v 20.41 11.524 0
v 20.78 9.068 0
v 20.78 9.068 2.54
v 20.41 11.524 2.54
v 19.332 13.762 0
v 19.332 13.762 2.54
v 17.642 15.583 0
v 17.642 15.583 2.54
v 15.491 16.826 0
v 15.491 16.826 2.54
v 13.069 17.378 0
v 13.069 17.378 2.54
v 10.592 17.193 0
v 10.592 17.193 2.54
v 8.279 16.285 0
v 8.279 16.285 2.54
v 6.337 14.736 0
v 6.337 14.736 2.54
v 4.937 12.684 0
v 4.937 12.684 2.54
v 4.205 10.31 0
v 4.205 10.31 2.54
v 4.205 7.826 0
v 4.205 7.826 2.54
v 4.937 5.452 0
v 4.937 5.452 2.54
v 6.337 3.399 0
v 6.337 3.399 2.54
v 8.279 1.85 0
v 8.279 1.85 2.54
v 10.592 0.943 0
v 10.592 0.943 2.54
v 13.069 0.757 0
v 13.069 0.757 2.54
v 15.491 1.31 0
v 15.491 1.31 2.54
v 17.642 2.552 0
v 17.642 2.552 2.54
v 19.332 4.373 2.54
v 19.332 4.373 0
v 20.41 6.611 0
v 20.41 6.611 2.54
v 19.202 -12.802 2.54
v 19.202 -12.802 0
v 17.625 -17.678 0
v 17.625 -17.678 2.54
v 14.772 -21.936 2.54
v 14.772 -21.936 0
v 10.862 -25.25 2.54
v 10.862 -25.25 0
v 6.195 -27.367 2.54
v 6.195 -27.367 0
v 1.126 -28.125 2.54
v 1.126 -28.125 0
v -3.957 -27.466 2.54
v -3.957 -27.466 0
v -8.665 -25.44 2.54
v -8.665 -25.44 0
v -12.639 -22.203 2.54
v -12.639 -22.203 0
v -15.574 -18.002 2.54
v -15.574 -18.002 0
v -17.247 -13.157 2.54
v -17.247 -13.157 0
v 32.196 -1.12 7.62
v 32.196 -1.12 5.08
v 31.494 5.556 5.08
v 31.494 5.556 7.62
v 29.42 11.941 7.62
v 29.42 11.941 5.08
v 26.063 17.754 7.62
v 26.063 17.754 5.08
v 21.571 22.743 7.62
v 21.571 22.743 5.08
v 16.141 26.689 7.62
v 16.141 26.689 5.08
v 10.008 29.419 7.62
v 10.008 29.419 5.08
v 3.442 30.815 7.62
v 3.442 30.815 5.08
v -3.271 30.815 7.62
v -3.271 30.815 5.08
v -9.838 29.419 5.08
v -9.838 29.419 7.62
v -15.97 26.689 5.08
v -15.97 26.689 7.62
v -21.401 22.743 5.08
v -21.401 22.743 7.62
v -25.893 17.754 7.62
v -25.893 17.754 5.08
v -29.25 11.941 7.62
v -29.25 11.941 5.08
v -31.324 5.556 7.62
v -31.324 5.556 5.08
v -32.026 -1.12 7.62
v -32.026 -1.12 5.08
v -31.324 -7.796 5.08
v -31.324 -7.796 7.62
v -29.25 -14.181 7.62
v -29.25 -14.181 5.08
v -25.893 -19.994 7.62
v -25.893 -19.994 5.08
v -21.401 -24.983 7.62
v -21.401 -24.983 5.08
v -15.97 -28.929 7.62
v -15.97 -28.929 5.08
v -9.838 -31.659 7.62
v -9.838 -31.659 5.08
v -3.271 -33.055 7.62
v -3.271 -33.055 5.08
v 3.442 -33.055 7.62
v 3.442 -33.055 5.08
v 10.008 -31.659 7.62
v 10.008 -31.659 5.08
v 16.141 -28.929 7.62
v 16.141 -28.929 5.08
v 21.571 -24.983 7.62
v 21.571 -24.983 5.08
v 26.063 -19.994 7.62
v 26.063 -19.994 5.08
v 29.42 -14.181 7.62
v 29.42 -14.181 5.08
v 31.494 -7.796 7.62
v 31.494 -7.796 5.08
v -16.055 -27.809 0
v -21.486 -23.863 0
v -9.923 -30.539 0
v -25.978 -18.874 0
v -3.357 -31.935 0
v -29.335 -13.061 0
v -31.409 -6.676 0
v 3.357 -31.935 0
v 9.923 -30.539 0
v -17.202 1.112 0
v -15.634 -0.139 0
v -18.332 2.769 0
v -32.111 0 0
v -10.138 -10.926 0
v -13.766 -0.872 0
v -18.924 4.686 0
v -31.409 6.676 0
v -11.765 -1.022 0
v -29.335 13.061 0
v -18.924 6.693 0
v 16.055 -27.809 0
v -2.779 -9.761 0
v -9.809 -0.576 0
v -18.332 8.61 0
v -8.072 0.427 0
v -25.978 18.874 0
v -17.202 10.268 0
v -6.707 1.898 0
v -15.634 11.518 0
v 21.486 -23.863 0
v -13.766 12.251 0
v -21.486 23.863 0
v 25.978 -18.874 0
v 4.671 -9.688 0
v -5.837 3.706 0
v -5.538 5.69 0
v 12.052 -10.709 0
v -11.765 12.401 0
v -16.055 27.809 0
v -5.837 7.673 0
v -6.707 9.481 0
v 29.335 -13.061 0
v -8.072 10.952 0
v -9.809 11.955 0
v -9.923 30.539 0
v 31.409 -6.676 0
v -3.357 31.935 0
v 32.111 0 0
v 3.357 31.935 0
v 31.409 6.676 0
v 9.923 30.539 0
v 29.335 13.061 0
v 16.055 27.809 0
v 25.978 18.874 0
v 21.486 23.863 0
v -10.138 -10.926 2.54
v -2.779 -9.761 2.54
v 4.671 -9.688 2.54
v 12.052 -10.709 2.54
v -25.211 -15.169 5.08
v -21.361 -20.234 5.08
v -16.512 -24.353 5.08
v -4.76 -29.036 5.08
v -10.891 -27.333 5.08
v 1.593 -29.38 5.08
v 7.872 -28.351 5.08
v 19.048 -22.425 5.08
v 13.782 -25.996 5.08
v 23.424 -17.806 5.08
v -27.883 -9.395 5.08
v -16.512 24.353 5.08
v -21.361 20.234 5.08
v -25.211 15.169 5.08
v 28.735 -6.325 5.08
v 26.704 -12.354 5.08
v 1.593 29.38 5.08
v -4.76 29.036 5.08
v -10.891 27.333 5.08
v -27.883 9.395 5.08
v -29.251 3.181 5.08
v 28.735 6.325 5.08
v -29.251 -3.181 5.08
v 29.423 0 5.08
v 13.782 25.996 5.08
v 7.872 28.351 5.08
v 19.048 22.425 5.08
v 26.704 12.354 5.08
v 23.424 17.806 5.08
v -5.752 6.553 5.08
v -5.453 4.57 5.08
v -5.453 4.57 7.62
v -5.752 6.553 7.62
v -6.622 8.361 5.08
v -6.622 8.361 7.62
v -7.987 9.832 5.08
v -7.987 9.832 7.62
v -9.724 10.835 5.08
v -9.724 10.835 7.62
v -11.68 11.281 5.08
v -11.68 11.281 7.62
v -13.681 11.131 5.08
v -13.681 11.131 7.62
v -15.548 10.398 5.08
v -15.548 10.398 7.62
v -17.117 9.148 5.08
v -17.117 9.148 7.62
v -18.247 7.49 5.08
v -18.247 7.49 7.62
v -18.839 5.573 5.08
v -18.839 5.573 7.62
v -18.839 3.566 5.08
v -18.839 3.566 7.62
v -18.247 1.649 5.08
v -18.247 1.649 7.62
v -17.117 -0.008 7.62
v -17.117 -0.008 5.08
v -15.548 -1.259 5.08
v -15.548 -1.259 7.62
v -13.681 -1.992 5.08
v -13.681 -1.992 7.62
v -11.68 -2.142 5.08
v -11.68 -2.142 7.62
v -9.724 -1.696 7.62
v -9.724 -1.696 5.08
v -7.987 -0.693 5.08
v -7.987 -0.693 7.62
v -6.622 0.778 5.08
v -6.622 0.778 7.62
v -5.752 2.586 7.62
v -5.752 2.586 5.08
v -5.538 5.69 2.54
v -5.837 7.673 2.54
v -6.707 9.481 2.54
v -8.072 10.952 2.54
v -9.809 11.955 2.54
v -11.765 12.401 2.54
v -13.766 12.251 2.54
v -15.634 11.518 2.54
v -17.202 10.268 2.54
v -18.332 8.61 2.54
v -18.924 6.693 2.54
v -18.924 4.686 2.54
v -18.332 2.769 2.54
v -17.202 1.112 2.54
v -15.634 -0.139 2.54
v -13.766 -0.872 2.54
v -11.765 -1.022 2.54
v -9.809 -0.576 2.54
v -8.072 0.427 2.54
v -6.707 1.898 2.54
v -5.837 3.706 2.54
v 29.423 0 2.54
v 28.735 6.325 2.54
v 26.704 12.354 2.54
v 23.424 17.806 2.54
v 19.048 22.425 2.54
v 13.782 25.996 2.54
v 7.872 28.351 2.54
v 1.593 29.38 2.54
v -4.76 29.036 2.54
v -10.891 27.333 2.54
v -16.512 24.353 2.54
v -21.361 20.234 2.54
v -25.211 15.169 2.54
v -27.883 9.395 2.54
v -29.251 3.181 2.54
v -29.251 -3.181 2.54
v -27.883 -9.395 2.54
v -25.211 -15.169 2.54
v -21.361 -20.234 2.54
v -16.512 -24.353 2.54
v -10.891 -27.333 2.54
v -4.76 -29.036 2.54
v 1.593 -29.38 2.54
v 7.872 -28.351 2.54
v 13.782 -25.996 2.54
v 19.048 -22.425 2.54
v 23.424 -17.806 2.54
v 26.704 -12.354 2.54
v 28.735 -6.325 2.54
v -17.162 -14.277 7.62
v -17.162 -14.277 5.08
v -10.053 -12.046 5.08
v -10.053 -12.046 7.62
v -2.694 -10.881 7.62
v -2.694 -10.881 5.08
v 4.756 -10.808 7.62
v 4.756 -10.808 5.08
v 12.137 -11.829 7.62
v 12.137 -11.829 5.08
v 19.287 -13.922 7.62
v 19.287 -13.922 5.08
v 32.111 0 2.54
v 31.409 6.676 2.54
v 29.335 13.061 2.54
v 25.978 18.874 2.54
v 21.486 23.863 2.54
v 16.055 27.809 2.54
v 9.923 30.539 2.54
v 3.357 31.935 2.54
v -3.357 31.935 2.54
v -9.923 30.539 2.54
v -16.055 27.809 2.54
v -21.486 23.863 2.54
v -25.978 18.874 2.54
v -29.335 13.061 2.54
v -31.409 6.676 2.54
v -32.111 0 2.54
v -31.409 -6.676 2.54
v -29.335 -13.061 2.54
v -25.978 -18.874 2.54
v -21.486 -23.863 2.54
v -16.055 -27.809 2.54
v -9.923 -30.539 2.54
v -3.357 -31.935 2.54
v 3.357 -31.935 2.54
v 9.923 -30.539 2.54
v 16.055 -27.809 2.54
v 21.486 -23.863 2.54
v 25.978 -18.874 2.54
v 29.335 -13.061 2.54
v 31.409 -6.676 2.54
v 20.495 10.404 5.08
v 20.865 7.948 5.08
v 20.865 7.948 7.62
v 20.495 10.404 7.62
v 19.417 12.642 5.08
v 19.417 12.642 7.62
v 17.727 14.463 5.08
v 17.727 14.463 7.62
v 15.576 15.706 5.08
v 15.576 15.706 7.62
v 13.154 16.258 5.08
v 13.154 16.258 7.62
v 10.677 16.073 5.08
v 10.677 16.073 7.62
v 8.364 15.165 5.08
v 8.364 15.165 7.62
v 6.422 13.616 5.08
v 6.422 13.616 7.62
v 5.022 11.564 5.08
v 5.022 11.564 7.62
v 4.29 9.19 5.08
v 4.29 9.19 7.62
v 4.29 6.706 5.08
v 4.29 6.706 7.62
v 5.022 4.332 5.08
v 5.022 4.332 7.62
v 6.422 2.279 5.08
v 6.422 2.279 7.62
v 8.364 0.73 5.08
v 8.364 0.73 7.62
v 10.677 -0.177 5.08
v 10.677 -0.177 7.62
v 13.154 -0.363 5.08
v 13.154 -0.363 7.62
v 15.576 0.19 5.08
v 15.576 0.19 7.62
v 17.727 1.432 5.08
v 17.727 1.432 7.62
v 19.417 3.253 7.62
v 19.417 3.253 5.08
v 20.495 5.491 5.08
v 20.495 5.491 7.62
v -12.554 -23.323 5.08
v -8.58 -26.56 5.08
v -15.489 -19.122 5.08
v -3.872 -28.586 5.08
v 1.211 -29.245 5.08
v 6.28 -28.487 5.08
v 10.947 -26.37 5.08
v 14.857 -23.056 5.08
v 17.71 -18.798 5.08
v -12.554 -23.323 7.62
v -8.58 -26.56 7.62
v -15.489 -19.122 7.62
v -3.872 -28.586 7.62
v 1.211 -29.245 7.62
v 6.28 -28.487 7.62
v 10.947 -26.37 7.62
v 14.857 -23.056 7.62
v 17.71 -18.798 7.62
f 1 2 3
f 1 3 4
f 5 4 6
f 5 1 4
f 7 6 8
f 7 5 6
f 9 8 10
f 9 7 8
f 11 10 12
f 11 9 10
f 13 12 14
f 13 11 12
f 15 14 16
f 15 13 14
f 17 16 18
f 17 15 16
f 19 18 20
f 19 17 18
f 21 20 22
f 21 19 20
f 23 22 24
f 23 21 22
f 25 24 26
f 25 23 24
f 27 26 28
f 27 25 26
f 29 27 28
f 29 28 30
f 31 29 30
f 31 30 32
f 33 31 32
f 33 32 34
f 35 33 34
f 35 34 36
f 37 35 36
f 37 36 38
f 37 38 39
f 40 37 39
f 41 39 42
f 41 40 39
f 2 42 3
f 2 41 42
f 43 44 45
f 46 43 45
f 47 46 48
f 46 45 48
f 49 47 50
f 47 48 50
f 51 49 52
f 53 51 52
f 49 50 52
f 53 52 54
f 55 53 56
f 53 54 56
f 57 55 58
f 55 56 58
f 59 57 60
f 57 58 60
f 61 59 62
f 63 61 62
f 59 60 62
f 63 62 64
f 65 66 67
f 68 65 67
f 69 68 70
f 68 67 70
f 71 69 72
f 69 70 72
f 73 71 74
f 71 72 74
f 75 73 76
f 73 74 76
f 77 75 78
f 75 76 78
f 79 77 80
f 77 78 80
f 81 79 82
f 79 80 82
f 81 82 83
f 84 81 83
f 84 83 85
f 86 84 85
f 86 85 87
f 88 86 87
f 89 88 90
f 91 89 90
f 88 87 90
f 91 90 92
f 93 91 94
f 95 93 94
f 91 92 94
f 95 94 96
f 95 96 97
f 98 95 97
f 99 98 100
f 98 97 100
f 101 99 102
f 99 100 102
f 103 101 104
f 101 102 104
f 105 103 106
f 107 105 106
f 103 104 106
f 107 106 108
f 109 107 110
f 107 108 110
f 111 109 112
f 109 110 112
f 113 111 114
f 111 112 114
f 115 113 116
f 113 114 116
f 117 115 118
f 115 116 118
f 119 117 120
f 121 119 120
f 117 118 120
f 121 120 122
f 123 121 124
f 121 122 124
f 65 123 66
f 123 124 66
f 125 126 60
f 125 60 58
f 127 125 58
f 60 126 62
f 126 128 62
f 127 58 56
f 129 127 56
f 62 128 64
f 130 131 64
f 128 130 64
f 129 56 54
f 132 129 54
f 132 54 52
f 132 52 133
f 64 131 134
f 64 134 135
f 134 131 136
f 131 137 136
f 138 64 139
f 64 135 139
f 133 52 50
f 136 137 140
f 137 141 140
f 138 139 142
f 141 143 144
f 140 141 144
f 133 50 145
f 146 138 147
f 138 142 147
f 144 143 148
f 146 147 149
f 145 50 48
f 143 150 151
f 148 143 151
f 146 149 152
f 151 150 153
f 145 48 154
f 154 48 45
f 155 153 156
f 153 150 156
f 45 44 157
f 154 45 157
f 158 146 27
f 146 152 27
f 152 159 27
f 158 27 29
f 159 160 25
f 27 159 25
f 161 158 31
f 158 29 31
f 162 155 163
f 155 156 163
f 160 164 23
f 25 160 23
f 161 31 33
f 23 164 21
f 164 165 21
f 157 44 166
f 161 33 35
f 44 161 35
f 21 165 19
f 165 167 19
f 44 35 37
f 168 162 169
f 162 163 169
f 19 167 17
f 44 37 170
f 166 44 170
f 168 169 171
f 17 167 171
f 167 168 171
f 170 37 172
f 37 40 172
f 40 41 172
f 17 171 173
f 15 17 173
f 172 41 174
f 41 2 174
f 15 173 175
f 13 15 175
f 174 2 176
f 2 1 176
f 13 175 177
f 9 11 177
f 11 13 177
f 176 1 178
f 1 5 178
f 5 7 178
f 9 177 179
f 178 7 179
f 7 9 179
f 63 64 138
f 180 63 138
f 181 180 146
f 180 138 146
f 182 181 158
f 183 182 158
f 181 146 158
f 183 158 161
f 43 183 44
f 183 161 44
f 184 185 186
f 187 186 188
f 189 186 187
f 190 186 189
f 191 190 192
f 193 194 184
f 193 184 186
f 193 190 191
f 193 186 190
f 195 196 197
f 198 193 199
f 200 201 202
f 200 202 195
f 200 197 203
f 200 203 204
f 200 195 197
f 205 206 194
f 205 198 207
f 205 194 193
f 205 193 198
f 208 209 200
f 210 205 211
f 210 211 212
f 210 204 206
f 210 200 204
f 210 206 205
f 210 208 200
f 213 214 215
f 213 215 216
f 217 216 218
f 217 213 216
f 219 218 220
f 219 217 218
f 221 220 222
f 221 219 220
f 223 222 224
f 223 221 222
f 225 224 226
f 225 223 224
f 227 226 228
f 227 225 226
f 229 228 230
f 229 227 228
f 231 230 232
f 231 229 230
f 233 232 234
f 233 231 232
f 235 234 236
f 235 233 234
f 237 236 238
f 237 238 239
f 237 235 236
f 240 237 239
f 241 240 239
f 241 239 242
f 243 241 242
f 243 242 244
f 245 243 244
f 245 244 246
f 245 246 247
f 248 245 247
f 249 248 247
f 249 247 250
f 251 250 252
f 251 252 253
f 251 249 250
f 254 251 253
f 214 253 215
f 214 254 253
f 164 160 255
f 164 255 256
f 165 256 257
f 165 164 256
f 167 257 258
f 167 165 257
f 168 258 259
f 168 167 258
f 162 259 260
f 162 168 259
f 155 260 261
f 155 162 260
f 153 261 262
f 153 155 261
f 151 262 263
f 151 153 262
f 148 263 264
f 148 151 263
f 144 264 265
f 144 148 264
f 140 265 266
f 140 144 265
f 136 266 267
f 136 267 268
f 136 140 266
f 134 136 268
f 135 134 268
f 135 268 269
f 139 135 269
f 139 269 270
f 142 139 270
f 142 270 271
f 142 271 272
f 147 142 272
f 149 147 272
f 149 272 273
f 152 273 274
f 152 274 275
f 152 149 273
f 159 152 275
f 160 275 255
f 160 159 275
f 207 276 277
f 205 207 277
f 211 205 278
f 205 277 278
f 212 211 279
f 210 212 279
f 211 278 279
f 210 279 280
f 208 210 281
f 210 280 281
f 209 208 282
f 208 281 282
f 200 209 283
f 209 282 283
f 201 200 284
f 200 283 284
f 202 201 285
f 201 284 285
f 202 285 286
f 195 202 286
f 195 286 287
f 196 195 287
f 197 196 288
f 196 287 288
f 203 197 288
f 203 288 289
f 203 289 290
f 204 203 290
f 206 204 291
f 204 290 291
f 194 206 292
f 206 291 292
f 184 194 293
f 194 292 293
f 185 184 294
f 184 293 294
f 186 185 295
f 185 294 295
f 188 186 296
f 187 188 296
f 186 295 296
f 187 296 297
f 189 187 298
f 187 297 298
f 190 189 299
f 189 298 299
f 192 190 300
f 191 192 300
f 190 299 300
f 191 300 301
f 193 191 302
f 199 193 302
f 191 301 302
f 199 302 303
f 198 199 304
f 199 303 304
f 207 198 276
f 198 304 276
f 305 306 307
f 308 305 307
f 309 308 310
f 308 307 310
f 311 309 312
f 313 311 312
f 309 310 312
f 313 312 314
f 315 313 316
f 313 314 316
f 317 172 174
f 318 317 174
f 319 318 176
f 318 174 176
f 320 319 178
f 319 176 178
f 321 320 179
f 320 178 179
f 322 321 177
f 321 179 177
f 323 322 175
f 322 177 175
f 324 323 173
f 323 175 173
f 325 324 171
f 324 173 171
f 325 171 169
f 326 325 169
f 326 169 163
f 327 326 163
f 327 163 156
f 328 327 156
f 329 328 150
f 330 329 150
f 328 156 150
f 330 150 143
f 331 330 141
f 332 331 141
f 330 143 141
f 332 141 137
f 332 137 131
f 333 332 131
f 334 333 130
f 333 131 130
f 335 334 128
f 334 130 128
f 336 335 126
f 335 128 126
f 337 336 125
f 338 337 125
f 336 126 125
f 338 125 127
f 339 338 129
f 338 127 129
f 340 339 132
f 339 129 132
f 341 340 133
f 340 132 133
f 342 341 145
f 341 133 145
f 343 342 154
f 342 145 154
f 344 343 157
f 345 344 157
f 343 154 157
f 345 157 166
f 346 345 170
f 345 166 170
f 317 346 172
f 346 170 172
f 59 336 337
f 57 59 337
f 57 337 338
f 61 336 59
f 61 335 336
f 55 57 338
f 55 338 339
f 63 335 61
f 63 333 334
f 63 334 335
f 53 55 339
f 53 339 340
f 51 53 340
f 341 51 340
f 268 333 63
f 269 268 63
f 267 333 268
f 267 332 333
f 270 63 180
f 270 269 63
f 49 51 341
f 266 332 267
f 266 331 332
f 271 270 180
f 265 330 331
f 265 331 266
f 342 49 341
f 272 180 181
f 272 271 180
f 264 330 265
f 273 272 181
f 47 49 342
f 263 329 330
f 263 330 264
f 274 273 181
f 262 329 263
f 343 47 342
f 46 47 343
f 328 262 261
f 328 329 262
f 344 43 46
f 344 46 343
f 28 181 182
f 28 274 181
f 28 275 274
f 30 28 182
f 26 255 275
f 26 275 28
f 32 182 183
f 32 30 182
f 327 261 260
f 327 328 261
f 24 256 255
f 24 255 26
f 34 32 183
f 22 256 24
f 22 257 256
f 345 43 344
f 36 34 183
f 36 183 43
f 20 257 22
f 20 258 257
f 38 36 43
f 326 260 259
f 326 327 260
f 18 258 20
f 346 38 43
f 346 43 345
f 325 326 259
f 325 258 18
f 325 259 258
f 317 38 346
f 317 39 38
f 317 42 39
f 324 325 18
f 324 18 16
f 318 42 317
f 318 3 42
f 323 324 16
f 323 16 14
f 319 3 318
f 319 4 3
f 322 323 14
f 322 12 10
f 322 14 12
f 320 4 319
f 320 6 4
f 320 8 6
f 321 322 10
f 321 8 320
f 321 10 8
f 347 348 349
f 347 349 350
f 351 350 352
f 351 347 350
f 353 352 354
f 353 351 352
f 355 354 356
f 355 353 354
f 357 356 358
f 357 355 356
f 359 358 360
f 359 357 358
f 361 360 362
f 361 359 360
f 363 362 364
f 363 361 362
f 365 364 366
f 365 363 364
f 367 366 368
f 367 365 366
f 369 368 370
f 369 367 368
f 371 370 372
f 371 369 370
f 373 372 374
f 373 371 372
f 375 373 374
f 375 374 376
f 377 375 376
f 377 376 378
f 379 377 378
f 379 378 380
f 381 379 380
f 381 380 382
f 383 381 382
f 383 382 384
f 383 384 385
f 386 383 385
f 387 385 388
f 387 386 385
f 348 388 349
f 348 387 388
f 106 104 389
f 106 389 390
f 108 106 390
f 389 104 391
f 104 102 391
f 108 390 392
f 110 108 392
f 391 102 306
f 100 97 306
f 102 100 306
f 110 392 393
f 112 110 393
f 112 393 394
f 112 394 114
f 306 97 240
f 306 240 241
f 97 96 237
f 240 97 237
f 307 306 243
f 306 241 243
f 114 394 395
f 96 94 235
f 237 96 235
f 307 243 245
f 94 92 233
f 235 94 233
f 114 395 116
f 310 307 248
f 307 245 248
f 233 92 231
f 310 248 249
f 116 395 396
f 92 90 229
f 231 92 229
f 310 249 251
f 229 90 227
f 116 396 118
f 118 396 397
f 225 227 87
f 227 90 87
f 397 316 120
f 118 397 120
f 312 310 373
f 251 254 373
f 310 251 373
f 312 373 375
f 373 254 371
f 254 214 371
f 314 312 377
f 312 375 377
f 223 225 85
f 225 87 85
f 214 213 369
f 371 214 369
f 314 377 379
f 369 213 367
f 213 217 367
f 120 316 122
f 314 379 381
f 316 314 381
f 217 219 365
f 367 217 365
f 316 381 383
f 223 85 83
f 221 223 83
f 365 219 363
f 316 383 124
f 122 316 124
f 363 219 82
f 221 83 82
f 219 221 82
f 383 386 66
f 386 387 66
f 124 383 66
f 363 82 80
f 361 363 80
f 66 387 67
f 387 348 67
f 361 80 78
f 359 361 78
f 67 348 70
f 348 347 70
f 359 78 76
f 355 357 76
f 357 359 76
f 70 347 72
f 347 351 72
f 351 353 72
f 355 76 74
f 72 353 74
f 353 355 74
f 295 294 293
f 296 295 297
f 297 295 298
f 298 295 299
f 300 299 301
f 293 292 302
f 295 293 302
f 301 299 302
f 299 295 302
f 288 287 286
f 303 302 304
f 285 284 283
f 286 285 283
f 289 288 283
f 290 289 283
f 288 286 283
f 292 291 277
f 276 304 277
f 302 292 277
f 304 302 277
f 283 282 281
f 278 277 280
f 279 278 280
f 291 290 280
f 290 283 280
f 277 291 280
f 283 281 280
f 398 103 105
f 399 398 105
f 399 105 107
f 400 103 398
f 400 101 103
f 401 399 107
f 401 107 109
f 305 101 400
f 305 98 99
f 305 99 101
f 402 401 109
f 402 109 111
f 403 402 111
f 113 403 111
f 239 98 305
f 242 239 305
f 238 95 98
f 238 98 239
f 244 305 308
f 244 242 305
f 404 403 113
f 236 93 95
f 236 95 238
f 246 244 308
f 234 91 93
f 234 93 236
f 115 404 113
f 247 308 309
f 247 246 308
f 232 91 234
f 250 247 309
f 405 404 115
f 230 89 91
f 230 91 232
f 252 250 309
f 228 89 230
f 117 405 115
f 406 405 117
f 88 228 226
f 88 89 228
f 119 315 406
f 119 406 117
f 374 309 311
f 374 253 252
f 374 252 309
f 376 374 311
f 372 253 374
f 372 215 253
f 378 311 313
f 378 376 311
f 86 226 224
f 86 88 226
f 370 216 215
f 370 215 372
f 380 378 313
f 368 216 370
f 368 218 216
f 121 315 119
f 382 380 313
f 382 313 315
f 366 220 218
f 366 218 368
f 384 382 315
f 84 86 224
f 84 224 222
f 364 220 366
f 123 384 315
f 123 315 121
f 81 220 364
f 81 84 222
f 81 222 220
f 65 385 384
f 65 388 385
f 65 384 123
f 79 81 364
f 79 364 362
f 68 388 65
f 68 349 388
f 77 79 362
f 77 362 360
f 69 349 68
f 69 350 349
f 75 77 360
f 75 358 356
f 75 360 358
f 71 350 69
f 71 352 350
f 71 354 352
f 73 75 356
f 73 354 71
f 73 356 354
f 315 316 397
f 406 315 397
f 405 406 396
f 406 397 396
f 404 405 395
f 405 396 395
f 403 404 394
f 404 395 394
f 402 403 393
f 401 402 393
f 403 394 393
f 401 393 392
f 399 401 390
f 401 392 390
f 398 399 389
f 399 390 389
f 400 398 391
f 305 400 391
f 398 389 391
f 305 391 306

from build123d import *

# Parameters (mm, degrees)
F0_R     = 32.110996
F0_R_2   = 6.730617
F0_R_3   = 8.333871
F1_DEPTH = 2.54
F2_R     = 29.423189
F3_DEPTH = 2.54
F4_R     = 32.110996
F4_R_2   = 6.730617
F4_R_3   = 8.333871
F5_DEPTH = 2.54


with BuildPart() as f1:
    # F0 (on Top) → F1 (new body)
    with BuildSketch(Plane.XY):
        Circle(F0_R)
        with BuildLine():
            ThreePointArc((19.2024, -12.8016), (1.125659, -28.124711), (-17.2466, -13.1572))
            ThreePointArc((-17.2466, -13.1572), (0.944805, -9.587197), (19.2024, -12.8016))
        make_face(mode=Mode.SUBTRACT)
        with Locations((-12.268201, 5.6896)):
            Circle(F0_R_2, mode=Mode.SUBTRACT)
        with Locations((12.445999, 9.067801)):
            Circle(F0_R_3, mode=Mode.SUBTRACT)
    extrude(amount=F1_DEPTH)


with BuildPart() as f3:
    # F2 (on face) → F3 (new body)
    with BuildSketch(Plane.XY.offset(2.54)):
        Circle(F2_R)
    extrude(amount=F3_DEPTH)


with BuildPart() as f5:
    # F4 (on face) → F5 (new body)
    with BuildSketch(Plane.XY.offset(5.08)):
        with Locations((0.085035, -1.120056)):
            Circle(F4_R)
        with BuildLine():
            ThreePointArc((19.287435, -13.921655), (1.210694, -29.244767), (-17.161566, -14.277256))
            ThreePointArc((-17.161566, -14.277256), (1.02984, -10.707252), (19.287435, -13.921655))
        make_face(mode=Mode.SUBTRACT)
        with Locations((-12.183166, 4.569544)):
            Circle(F4_R_2, mode=Mode.SUBTRACT)
        with Locations((12.531034, 7.947745)):
            Circle(F4_R_3, mode=Mode.SUBTRACT)
    extrude(amount=F5_DEPTH)


solid = Compound([f1.part, f3.part, f5.part])
